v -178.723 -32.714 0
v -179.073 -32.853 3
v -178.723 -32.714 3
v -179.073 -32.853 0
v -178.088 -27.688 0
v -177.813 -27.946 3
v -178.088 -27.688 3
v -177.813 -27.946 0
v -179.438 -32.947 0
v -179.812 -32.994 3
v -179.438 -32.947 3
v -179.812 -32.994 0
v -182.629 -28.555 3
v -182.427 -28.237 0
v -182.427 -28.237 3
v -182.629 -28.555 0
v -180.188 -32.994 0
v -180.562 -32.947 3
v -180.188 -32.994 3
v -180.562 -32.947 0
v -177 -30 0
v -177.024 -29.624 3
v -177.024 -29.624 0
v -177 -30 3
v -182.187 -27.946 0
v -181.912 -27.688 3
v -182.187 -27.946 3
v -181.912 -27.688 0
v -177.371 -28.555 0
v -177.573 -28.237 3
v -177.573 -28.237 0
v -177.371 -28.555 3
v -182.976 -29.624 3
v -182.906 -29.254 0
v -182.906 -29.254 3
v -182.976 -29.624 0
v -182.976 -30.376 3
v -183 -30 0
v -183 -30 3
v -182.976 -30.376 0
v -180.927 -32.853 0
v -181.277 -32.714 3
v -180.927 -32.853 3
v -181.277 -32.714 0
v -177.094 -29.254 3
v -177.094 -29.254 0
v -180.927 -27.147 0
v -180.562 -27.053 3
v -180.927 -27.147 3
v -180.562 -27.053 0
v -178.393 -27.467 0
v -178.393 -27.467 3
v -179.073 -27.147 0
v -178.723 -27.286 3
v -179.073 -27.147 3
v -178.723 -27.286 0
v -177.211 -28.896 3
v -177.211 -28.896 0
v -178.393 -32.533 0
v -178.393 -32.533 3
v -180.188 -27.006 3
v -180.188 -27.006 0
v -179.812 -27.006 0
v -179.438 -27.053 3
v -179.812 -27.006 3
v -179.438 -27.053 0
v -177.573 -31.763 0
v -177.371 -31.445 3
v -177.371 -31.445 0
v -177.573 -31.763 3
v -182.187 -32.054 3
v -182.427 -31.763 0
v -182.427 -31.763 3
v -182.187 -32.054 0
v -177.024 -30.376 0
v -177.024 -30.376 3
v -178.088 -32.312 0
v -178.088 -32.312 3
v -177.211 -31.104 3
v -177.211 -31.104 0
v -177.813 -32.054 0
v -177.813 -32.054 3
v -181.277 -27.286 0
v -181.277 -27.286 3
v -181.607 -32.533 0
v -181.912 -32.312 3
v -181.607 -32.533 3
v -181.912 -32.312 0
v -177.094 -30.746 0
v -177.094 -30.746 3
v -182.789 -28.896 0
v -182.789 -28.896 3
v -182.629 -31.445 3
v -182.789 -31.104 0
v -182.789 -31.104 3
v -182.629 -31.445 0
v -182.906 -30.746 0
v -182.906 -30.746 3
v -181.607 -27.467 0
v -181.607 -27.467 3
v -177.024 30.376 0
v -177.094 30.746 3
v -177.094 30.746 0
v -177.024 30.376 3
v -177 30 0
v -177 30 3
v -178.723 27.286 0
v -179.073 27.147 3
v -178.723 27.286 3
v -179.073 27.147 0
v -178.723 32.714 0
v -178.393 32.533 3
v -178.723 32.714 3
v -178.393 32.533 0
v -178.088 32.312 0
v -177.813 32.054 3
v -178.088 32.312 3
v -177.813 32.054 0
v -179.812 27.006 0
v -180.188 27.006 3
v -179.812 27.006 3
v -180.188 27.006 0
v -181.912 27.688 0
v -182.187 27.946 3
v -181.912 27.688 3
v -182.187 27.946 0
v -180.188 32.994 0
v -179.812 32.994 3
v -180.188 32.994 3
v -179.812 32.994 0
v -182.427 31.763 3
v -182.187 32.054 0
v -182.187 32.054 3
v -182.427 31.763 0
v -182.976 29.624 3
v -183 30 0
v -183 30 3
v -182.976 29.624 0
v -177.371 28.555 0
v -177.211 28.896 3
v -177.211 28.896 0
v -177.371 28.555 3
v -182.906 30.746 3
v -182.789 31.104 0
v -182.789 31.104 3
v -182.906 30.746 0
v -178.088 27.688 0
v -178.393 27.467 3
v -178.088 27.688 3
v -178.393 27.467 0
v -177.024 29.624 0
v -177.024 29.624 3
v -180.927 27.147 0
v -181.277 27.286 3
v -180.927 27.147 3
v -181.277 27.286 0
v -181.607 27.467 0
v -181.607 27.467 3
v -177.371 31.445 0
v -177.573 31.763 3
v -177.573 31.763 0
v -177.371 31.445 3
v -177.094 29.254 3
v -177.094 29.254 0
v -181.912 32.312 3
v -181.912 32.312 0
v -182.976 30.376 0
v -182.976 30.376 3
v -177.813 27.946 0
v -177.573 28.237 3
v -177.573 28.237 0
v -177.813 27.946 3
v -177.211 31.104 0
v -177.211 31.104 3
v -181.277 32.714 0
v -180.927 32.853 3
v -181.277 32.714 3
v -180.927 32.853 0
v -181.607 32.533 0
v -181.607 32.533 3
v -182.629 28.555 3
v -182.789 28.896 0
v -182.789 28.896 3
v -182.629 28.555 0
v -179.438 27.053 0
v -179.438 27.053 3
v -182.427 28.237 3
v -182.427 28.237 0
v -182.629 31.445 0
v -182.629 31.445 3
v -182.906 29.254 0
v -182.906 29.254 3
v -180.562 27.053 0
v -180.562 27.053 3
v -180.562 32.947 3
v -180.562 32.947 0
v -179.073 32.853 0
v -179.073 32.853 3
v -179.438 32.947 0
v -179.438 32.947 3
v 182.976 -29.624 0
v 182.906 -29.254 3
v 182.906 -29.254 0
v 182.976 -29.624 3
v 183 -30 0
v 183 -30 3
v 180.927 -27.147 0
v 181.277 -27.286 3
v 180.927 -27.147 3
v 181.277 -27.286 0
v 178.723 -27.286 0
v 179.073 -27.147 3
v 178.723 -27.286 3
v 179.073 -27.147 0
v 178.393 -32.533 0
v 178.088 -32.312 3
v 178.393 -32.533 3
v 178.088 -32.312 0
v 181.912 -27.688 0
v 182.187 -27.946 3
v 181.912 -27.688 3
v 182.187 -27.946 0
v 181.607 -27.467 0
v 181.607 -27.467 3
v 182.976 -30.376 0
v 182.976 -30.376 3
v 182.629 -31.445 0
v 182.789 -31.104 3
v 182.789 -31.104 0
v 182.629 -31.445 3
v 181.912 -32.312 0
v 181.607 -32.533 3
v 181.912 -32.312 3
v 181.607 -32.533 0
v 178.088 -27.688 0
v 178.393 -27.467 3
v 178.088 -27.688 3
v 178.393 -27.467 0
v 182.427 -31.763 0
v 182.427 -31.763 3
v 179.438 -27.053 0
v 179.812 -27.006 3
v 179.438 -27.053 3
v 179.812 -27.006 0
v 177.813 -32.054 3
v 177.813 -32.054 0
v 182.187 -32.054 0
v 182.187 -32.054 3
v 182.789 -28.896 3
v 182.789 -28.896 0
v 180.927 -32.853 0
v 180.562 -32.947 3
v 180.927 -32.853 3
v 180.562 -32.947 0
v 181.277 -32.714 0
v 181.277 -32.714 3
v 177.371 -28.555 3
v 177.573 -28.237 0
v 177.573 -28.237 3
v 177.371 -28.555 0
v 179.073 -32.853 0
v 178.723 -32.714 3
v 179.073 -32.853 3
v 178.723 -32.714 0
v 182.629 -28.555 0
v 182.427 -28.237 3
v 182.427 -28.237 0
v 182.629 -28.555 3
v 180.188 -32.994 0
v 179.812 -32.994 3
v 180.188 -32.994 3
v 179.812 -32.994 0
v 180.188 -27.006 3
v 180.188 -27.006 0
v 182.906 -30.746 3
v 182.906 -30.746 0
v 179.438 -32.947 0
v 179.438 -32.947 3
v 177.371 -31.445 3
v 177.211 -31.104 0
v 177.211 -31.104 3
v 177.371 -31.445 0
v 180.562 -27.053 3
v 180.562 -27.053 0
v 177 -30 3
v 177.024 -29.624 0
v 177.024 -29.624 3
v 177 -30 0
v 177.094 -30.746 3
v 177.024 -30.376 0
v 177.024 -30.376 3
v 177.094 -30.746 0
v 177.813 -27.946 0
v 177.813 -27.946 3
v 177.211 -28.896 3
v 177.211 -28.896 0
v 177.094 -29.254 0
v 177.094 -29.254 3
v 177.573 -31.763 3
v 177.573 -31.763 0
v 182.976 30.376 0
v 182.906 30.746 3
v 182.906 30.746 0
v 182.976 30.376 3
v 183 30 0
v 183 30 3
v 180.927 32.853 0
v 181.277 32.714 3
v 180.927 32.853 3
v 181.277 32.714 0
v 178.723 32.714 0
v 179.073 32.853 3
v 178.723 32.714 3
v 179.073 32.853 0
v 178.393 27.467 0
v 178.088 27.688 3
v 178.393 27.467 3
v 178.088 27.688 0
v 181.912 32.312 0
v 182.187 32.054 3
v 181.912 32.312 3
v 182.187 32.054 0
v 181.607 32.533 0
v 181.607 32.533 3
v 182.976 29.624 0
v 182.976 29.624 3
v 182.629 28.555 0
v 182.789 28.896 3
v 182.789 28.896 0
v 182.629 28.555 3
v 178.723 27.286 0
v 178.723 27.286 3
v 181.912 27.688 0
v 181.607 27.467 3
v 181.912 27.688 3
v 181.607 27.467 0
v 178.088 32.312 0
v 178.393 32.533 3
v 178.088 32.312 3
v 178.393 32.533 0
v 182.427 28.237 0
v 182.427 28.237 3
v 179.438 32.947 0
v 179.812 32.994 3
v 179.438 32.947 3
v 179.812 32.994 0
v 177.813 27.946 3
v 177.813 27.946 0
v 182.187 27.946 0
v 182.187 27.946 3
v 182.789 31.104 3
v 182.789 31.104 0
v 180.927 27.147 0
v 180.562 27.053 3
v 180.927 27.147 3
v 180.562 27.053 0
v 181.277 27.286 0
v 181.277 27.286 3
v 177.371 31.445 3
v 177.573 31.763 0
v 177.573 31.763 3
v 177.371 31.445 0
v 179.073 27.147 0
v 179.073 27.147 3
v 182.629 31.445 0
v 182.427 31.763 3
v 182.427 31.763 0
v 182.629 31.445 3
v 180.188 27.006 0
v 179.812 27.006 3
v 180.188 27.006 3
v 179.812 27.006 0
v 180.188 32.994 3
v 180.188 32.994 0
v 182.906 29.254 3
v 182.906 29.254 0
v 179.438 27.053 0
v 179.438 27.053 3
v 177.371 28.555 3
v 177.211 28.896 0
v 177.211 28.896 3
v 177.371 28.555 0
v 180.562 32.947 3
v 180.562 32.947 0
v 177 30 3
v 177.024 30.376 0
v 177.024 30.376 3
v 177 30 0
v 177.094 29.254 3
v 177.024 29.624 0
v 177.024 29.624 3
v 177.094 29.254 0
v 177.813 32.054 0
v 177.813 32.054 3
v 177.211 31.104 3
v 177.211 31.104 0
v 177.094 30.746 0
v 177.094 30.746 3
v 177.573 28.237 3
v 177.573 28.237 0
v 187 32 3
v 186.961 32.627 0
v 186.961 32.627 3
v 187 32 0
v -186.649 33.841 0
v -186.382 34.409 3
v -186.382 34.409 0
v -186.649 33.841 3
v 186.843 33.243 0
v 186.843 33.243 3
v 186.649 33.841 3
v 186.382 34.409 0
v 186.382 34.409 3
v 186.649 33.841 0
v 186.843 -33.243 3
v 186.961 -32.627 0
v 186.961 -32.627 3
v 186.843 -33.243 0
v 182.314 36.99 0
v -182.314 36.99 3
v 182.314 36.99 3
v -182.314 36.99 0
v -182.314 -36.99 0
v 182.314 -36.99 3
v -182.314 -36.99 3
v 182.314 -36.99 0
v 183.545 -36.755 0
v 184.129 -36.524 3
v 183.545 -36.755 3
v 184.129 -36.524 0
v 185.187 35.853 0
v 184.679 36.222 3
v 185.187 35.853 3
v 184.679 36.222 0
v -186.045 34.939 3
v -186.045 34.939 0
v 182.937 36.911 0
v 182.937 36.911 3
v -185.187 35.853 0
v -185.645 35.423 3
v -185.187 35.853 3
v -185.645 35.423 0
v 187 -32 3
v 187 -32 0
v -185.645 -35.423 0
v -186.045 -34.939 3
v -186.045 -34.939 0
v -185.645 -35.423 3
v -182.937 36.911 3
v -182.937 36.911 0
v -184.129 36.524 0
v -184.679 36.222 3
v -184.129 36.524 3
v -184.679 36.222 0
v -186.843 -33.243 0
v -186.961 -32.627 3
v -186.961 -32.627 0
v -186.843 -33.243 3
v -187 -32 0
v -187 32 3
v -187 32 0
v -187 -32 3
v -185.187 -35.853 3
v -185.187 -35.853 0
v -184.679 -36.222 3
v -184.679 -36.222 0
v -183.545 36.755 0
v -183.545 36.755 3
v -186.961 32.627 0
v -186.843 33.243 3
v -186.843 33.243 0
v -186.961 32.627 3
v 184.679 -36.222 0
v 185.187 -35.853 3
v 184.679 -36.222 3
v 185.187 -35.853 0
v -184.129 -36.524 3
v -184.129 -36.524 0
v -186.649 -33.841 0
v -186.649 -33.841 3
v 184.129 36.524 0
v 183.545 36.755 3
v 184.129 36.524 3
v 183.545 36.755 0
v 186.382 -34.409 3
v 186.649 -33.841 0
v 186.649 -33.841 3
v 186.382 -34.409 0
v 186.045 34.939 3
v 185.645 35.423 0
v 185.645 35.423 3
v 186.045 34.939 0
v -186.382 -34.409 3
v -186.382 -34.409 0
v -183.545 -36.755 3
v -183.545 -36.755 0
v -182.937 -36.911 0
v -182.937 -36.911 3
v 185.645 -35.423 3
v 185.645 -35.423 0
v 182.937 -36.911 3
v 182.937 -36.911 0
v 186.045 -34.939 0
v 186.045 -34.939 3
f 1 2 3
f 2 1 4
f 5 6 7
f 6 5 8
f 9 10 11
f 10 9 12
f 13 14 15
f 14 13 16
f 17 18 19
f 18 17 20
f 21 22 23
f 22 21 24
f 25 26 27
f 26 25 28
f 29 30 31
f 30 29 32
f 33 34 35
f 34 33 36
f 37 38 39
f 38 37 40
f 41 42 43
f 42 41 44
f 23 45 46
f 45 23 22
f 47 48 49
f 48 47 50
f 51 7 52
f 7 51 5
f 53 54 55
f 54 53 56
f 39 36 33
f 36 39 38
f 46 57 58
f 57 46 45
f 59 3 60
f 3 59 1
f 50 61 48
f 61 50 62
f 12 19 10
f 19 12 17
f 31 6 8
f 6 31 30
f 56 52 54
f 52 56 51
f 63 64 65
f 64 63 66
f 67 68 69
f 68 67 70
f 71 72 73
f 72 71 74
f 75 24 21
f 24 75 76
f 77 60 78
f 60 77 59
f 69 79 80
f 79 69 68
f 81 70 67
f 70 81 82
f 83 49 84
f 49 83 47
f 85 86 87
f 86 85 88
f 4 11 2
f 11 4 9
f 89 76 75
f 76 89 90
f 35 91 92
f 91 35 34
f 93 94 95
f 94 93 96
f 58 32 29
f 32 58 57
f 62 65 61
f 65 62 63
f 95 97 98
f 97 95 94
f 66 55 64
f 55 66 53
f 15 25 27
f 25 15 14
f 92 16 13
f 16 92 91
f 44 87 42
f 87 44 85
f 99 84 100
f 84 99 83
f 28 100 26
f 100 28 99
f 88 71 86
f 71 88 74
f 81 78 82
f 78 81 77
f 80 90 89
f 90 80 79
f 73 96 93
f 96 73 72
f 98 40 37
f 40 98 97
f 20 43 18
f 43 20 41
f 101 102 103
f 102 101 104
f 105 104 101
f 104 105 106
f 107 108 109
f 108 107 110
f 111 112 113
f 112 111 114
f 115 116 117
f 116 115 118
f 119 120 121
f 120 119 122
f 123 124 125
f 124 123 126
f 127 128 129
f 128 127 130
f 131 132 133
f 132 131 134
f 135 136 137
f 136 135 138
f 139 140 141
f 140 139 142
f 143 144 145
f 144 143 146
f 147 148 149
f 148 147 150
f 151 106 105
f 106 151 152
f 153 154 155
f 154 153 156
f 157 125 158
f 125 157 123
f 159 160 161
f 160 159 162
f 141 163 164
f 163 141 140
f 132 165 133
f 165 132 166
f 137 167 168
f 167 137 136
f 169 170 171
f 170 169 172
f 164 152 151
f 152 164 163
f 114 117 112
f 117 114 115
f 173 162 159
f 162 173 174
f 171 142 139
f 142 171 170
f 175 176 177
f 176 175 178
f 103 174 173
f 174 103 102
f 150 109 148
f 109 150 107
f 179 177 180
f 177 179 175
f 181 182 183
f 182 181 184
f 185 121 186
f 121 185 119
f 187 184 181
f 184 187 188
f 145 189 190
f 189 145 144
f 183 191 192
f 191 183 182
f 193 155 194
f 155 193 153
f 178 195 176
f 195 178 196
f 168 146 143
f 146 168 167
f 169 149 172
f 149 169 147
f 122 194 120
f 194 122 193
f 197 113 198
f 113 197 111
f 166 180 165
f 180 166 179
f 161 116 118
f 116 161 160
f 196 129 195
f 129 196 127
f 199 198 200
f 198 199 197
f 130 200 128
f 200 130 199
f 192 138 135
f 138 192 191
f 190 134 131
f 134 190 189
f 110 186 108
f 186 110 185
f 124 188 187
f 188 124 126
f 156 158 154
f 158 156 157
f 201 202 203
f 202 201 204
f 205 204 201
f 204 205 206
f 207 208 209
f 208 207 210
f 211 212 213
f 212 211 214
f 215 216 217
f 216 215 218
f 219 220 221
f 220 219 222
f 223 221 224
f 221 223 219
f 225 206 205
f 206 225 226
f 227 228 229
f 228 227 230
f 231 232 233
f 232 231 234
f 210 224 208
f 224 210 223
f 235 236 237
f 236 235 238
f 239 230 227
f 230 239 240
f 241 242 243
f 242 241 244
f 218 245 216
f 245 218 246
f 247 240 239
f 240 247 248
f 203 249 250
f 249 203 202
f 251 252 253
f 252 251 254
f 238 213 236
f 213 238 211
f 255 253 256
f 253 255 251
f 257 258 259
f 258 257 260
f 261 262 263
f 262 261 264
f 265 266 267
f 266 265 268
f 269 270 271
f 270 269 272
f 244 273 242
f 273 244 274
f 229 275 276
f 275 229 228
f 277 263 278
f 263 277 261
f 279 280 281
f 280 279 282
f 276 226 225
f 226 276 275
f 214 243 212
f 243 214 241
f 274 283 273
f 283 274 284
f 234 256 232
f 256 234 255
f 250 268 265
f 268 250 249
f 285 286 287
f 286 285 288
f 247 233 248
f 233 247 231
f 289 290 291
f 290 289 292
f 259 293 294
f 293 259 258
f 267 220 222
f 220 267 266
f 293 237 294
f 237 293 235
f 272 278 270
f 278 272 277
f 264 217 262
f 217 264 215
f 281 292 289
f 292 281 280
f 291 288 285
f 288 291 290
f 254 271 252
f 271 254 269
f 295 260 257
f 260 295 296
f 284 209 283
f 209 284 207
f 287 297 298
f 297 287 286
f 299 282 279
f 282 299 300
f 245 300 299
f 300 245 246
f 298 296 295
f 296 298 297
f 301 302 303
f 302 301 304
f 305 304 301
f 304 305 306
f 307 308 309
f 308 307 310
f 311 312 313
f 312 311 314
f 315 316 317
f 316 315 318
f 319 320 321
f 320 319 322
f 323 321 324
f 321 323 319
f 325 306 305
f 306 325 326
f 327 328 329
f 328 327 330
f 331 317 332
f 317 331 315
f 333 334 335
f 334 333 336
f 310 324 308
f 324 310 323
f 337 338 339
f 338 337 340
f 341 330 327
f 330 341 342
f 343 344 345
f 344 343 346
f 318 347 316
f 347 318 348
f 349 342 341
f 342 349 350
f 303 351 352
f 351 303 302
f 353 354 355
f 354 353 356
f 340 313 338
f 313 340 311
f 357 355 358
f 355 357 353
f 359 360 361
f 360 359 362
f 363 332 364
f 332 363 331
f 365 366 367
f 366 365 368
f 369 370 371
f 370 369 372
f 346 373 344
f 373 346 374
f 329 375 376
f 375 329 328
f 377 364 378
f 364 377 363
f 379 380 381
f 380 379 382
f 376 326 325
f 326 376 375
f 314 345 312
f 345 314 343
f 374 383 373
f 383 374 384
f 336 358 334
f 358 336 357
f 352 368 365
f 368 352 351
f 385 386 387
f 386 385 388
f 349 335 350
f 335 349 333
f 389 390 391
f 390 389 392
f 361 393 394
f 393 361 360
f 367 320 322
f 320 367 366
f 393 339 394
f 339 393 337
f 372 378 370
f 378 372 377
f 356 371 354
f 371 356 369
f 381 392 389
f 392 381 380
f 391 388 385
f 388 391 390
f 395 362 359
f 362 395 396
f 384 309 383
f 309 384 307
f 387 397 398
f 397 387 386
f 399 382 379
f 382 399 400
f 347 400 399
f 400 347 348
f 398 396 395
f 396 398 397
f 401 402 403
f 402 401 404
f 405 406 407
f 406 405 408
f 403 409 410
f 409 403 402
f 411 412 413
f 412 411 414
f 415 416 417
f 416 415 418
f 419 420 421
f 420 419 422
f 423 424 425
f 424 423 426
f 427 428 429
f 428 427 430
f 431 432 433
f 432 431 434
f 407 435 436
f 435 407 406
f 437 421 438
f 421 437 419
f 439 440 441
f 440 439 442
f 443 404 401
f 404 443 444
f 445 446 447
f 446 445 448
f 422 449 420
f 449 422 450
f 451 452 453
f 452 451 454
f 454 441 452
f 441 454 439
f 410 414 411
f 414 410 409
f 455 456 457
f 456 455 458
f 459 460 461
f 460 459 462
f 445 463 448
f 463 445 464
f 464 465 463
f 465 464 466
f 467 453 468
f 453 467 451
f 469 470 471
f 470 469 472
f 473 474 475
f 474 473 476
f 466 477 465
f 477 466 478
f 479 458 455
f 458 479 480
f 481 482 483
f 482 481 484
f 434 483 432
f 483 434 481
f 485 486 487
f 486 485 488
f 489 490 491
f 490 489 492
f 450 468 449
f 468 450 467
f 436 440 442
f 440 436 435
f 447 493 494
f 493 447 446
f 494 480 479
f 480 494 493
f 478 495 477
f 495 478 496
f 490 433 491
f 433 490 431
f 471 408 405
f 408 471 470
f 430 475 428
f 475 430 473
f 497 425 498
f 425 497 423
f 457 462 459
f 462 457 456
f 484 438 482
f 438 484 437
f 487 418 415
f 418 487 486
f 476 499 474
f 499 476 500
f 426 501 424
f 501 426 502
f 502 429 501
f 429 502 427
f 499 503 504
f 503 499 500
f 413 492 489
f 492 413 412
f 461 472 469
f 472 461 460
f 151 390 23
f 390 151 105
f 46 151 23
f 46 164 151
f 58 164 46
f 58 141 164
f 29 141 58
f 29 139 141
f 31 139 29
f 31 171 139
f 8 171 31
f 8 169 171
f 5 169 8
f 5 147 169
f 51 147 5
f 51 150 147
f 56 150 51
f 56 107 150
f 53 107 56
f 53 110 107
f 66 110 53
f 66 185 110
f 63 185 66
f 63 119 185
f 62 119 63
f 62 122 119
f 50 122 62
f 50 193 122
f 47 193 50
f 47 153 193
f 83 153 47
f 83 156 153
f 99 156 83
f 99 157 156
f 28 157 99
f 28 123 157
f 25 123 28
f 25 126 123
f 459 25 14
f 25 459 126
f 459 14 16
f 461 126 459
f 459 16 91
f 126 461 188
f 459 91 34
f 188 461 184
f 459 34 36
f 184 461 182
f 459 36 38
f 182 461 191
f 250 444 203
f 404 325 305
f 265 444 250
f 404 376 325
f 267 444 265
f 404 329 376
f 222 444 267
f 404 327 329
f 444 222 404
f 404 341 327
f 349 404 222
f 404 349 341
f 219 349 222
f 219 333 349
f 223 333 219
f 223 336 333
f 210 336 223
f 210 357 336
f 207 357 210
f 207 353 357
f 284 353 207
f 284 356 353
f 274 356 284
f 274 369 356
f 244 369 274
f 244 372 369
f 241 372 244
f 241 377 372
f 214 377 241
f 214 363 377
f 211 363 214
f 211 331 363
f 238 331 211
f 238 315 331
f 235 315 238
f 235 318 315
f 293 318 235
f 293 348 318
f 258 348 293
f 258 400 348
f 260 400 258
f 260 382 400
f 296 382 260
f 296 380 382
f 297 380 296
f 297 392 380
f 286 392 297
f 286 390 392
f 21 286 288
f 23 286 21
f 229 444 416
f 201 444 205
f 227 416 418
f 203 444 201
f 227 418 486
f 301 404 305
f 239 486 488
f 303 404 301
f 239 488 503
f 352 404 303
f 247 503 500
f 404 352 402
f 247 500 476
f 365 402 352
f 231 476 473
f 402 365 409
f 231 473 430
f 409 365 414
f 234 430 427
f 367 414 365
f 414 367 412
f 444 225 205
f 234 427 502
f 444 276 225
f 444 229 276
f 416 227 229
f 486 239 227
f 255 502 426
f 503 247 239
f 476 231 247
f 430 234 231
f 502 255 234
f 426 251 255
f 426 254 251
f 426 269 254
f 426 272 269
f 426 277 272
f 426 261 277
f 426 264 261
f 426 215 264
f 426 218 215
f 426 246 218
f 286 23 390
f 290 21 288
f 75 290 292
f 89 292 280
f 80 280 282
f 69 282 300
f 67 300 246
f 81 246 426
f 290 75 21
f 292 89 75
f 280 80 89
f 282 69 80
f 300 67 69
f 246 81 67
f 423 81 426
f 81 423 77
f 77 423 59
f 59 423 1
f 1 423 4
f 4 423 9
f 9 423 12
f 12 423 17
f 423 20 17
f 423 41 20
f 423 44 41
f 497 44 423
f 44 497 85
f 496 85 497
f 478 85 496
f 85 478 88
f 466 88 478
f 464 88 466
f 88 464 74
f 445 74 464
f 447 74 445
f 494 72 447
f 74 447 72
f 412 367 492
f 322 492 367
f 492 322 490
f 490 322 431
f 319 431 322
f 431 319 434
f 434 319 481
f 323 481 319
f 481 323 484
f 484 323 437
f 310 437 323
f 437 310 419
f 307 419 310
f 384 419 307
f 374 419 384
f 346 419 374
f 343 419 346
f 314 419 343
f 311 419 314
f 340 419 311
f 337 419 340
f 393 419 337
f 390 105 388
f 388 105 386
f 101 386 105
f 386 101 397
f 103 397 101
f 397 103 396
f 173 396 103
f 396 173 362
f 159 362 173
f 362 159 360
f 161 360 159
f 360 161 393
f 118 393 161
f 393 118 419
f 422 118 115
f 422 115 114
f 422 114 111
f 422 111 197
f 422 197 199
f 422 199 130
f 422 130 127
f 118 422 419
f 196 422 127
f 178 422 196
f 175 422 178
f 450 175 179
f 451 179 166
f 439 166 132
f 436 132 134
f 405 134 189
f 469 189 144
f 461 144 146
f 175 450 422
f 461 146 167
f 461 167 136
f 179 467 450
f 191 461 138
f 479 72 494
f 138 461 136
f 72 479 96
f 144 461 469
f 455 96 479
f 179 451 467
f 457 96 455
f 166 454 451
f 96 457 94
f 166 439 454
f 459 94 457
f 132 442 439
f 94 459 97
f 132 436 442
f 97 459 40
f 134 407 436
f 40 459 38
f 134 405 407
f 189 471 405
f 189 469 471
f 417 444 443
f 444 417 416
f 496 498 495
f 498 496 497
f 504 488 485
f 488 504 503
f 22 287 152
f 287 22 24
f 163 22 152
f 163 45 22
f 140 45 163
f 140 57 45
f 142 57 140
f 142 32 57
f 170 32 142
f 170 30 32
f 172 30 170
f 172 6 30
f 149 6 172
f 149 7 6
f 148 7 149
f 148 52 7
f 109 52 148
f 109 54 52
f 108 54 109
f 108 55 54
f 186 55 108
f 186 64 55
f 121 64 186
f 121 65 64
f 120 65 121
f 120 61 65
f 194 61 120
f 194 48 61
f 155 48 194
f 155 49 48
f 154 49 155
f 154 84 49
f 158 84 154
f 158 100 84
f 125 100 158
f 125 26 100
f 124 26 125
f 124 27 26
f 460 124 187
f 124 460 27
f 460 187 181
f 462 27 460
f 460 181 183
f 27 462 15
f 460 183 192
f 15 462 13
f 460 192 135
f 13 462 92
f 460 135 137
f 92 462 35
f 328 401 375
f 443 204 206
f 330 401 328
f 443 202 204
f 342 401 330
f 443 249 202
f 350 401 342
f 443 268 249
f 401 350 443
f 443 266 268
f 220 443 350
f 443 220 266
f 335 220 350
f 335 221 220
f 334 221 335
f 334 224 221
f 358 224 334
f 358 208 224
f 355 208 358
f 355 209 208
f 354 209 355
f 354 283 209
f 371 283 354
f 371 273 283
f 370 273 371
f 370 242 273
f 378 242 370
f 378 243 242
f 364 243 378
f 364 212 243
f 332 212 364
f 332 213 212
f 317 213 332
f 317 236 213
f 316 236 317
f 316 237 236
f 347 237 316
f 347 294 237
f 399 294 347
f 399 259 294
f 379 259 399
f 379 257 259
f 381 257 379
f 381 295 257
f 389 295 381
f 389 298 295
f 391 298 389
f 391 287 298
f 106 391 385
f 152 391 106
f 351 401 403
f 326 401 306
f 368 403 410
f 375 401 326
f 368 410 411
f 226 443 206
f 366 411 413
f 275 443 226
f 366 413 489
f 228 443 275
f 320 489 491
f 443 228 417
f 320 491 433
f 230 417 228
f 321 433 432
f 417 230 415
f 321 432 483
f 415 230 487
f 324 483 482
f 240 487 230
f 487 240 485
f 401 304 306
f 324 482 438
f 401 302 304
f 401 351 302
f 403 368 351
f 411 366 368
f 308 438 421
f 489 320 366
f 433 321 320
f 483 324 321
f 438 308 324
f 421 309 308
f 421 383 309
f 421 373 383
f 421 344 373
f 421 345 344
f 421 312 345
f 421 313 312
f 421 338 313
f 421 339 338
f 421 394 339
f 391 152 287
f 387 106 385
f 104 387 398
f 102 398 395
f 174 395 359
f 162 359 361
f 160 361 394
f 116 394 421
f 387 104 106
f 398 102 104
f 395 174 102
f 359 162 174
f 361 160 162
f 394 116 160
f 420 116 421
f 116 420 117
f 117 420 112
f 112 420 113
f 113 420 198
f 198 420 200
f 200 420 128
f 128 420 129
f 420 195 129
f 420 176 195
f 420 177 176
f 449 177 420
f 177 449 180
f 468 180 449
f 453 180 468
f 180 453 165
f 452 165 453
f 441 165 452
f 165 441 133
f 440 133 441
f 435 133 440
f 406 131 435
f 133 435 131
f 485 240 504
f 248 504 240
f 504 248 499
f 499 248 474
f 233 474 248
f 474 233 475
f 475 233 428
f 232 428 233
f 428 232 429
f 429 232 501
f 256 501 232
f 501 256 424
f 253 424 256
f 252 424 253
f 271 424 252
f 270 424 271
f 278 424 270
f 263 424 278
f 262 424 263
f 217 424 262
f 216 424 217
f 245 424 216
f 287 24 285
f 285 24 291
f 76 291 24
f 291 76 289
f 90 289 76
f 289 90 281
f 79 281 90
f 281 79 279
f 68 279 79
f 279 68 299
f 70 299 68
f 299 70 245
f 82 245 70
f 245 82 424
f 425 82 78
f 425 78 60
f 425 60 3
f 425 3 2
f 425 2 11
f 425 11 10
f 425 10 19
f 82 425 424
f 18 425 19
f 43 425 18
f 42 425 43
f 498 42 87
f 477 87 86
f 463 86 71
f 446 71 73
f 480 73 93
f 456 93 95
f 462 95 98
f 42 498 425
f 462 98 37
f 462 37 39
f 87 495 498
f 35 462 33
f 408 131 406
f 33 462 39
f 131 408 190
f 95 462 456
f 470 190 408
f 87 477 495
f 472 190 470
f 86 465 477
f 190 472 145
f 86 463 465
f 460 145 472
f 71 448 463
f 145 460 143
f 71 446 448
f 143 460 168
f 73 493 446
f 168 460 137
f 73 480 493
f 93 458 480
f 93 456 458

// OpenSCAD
$fn = 50;


difference() {
	union() {
		hull() {
			translate(v = [-182.0000000000, 32.0000000000, 0]) {
				cylinder(h = 3, r = 5);
			}
			translate(v = [182.0000000000, 32.0000000000, 0]) {
				cylinder(h = 3, r = 5);
			}
			translate(v = [-182.0000000000, -32.0000000000, 0]) {
				cylinder(h = 3, r = 5);
			}
			translate(v = [182.0000000000, -32.0000000000, 0]) {
				cylinder(h = 3, r = 5);
			}
		}
	}
	union() {
		translate(v = [-180.0000000000, -30.0000000000, -100.0000000000]) {
			cylinder(h = 200, r = 3.0000000000);
		}
		translate(v = [-180.0000000000, 30.0000000000, -100.0000000000]) {
			cylinder(h = 200, r = 3.0000000000);
		}
		translate(v = [180.0000000000, -30.0000000000, -100.0000000000]) {
			cylinder(h = 200, r = 3.0000000000);
		}
		translate(v = [180.0000000000, 30.0000000000, -100.0000000000]) {
			cylinder(h = 200, r = 3.0000000000);
		}
	}
}
